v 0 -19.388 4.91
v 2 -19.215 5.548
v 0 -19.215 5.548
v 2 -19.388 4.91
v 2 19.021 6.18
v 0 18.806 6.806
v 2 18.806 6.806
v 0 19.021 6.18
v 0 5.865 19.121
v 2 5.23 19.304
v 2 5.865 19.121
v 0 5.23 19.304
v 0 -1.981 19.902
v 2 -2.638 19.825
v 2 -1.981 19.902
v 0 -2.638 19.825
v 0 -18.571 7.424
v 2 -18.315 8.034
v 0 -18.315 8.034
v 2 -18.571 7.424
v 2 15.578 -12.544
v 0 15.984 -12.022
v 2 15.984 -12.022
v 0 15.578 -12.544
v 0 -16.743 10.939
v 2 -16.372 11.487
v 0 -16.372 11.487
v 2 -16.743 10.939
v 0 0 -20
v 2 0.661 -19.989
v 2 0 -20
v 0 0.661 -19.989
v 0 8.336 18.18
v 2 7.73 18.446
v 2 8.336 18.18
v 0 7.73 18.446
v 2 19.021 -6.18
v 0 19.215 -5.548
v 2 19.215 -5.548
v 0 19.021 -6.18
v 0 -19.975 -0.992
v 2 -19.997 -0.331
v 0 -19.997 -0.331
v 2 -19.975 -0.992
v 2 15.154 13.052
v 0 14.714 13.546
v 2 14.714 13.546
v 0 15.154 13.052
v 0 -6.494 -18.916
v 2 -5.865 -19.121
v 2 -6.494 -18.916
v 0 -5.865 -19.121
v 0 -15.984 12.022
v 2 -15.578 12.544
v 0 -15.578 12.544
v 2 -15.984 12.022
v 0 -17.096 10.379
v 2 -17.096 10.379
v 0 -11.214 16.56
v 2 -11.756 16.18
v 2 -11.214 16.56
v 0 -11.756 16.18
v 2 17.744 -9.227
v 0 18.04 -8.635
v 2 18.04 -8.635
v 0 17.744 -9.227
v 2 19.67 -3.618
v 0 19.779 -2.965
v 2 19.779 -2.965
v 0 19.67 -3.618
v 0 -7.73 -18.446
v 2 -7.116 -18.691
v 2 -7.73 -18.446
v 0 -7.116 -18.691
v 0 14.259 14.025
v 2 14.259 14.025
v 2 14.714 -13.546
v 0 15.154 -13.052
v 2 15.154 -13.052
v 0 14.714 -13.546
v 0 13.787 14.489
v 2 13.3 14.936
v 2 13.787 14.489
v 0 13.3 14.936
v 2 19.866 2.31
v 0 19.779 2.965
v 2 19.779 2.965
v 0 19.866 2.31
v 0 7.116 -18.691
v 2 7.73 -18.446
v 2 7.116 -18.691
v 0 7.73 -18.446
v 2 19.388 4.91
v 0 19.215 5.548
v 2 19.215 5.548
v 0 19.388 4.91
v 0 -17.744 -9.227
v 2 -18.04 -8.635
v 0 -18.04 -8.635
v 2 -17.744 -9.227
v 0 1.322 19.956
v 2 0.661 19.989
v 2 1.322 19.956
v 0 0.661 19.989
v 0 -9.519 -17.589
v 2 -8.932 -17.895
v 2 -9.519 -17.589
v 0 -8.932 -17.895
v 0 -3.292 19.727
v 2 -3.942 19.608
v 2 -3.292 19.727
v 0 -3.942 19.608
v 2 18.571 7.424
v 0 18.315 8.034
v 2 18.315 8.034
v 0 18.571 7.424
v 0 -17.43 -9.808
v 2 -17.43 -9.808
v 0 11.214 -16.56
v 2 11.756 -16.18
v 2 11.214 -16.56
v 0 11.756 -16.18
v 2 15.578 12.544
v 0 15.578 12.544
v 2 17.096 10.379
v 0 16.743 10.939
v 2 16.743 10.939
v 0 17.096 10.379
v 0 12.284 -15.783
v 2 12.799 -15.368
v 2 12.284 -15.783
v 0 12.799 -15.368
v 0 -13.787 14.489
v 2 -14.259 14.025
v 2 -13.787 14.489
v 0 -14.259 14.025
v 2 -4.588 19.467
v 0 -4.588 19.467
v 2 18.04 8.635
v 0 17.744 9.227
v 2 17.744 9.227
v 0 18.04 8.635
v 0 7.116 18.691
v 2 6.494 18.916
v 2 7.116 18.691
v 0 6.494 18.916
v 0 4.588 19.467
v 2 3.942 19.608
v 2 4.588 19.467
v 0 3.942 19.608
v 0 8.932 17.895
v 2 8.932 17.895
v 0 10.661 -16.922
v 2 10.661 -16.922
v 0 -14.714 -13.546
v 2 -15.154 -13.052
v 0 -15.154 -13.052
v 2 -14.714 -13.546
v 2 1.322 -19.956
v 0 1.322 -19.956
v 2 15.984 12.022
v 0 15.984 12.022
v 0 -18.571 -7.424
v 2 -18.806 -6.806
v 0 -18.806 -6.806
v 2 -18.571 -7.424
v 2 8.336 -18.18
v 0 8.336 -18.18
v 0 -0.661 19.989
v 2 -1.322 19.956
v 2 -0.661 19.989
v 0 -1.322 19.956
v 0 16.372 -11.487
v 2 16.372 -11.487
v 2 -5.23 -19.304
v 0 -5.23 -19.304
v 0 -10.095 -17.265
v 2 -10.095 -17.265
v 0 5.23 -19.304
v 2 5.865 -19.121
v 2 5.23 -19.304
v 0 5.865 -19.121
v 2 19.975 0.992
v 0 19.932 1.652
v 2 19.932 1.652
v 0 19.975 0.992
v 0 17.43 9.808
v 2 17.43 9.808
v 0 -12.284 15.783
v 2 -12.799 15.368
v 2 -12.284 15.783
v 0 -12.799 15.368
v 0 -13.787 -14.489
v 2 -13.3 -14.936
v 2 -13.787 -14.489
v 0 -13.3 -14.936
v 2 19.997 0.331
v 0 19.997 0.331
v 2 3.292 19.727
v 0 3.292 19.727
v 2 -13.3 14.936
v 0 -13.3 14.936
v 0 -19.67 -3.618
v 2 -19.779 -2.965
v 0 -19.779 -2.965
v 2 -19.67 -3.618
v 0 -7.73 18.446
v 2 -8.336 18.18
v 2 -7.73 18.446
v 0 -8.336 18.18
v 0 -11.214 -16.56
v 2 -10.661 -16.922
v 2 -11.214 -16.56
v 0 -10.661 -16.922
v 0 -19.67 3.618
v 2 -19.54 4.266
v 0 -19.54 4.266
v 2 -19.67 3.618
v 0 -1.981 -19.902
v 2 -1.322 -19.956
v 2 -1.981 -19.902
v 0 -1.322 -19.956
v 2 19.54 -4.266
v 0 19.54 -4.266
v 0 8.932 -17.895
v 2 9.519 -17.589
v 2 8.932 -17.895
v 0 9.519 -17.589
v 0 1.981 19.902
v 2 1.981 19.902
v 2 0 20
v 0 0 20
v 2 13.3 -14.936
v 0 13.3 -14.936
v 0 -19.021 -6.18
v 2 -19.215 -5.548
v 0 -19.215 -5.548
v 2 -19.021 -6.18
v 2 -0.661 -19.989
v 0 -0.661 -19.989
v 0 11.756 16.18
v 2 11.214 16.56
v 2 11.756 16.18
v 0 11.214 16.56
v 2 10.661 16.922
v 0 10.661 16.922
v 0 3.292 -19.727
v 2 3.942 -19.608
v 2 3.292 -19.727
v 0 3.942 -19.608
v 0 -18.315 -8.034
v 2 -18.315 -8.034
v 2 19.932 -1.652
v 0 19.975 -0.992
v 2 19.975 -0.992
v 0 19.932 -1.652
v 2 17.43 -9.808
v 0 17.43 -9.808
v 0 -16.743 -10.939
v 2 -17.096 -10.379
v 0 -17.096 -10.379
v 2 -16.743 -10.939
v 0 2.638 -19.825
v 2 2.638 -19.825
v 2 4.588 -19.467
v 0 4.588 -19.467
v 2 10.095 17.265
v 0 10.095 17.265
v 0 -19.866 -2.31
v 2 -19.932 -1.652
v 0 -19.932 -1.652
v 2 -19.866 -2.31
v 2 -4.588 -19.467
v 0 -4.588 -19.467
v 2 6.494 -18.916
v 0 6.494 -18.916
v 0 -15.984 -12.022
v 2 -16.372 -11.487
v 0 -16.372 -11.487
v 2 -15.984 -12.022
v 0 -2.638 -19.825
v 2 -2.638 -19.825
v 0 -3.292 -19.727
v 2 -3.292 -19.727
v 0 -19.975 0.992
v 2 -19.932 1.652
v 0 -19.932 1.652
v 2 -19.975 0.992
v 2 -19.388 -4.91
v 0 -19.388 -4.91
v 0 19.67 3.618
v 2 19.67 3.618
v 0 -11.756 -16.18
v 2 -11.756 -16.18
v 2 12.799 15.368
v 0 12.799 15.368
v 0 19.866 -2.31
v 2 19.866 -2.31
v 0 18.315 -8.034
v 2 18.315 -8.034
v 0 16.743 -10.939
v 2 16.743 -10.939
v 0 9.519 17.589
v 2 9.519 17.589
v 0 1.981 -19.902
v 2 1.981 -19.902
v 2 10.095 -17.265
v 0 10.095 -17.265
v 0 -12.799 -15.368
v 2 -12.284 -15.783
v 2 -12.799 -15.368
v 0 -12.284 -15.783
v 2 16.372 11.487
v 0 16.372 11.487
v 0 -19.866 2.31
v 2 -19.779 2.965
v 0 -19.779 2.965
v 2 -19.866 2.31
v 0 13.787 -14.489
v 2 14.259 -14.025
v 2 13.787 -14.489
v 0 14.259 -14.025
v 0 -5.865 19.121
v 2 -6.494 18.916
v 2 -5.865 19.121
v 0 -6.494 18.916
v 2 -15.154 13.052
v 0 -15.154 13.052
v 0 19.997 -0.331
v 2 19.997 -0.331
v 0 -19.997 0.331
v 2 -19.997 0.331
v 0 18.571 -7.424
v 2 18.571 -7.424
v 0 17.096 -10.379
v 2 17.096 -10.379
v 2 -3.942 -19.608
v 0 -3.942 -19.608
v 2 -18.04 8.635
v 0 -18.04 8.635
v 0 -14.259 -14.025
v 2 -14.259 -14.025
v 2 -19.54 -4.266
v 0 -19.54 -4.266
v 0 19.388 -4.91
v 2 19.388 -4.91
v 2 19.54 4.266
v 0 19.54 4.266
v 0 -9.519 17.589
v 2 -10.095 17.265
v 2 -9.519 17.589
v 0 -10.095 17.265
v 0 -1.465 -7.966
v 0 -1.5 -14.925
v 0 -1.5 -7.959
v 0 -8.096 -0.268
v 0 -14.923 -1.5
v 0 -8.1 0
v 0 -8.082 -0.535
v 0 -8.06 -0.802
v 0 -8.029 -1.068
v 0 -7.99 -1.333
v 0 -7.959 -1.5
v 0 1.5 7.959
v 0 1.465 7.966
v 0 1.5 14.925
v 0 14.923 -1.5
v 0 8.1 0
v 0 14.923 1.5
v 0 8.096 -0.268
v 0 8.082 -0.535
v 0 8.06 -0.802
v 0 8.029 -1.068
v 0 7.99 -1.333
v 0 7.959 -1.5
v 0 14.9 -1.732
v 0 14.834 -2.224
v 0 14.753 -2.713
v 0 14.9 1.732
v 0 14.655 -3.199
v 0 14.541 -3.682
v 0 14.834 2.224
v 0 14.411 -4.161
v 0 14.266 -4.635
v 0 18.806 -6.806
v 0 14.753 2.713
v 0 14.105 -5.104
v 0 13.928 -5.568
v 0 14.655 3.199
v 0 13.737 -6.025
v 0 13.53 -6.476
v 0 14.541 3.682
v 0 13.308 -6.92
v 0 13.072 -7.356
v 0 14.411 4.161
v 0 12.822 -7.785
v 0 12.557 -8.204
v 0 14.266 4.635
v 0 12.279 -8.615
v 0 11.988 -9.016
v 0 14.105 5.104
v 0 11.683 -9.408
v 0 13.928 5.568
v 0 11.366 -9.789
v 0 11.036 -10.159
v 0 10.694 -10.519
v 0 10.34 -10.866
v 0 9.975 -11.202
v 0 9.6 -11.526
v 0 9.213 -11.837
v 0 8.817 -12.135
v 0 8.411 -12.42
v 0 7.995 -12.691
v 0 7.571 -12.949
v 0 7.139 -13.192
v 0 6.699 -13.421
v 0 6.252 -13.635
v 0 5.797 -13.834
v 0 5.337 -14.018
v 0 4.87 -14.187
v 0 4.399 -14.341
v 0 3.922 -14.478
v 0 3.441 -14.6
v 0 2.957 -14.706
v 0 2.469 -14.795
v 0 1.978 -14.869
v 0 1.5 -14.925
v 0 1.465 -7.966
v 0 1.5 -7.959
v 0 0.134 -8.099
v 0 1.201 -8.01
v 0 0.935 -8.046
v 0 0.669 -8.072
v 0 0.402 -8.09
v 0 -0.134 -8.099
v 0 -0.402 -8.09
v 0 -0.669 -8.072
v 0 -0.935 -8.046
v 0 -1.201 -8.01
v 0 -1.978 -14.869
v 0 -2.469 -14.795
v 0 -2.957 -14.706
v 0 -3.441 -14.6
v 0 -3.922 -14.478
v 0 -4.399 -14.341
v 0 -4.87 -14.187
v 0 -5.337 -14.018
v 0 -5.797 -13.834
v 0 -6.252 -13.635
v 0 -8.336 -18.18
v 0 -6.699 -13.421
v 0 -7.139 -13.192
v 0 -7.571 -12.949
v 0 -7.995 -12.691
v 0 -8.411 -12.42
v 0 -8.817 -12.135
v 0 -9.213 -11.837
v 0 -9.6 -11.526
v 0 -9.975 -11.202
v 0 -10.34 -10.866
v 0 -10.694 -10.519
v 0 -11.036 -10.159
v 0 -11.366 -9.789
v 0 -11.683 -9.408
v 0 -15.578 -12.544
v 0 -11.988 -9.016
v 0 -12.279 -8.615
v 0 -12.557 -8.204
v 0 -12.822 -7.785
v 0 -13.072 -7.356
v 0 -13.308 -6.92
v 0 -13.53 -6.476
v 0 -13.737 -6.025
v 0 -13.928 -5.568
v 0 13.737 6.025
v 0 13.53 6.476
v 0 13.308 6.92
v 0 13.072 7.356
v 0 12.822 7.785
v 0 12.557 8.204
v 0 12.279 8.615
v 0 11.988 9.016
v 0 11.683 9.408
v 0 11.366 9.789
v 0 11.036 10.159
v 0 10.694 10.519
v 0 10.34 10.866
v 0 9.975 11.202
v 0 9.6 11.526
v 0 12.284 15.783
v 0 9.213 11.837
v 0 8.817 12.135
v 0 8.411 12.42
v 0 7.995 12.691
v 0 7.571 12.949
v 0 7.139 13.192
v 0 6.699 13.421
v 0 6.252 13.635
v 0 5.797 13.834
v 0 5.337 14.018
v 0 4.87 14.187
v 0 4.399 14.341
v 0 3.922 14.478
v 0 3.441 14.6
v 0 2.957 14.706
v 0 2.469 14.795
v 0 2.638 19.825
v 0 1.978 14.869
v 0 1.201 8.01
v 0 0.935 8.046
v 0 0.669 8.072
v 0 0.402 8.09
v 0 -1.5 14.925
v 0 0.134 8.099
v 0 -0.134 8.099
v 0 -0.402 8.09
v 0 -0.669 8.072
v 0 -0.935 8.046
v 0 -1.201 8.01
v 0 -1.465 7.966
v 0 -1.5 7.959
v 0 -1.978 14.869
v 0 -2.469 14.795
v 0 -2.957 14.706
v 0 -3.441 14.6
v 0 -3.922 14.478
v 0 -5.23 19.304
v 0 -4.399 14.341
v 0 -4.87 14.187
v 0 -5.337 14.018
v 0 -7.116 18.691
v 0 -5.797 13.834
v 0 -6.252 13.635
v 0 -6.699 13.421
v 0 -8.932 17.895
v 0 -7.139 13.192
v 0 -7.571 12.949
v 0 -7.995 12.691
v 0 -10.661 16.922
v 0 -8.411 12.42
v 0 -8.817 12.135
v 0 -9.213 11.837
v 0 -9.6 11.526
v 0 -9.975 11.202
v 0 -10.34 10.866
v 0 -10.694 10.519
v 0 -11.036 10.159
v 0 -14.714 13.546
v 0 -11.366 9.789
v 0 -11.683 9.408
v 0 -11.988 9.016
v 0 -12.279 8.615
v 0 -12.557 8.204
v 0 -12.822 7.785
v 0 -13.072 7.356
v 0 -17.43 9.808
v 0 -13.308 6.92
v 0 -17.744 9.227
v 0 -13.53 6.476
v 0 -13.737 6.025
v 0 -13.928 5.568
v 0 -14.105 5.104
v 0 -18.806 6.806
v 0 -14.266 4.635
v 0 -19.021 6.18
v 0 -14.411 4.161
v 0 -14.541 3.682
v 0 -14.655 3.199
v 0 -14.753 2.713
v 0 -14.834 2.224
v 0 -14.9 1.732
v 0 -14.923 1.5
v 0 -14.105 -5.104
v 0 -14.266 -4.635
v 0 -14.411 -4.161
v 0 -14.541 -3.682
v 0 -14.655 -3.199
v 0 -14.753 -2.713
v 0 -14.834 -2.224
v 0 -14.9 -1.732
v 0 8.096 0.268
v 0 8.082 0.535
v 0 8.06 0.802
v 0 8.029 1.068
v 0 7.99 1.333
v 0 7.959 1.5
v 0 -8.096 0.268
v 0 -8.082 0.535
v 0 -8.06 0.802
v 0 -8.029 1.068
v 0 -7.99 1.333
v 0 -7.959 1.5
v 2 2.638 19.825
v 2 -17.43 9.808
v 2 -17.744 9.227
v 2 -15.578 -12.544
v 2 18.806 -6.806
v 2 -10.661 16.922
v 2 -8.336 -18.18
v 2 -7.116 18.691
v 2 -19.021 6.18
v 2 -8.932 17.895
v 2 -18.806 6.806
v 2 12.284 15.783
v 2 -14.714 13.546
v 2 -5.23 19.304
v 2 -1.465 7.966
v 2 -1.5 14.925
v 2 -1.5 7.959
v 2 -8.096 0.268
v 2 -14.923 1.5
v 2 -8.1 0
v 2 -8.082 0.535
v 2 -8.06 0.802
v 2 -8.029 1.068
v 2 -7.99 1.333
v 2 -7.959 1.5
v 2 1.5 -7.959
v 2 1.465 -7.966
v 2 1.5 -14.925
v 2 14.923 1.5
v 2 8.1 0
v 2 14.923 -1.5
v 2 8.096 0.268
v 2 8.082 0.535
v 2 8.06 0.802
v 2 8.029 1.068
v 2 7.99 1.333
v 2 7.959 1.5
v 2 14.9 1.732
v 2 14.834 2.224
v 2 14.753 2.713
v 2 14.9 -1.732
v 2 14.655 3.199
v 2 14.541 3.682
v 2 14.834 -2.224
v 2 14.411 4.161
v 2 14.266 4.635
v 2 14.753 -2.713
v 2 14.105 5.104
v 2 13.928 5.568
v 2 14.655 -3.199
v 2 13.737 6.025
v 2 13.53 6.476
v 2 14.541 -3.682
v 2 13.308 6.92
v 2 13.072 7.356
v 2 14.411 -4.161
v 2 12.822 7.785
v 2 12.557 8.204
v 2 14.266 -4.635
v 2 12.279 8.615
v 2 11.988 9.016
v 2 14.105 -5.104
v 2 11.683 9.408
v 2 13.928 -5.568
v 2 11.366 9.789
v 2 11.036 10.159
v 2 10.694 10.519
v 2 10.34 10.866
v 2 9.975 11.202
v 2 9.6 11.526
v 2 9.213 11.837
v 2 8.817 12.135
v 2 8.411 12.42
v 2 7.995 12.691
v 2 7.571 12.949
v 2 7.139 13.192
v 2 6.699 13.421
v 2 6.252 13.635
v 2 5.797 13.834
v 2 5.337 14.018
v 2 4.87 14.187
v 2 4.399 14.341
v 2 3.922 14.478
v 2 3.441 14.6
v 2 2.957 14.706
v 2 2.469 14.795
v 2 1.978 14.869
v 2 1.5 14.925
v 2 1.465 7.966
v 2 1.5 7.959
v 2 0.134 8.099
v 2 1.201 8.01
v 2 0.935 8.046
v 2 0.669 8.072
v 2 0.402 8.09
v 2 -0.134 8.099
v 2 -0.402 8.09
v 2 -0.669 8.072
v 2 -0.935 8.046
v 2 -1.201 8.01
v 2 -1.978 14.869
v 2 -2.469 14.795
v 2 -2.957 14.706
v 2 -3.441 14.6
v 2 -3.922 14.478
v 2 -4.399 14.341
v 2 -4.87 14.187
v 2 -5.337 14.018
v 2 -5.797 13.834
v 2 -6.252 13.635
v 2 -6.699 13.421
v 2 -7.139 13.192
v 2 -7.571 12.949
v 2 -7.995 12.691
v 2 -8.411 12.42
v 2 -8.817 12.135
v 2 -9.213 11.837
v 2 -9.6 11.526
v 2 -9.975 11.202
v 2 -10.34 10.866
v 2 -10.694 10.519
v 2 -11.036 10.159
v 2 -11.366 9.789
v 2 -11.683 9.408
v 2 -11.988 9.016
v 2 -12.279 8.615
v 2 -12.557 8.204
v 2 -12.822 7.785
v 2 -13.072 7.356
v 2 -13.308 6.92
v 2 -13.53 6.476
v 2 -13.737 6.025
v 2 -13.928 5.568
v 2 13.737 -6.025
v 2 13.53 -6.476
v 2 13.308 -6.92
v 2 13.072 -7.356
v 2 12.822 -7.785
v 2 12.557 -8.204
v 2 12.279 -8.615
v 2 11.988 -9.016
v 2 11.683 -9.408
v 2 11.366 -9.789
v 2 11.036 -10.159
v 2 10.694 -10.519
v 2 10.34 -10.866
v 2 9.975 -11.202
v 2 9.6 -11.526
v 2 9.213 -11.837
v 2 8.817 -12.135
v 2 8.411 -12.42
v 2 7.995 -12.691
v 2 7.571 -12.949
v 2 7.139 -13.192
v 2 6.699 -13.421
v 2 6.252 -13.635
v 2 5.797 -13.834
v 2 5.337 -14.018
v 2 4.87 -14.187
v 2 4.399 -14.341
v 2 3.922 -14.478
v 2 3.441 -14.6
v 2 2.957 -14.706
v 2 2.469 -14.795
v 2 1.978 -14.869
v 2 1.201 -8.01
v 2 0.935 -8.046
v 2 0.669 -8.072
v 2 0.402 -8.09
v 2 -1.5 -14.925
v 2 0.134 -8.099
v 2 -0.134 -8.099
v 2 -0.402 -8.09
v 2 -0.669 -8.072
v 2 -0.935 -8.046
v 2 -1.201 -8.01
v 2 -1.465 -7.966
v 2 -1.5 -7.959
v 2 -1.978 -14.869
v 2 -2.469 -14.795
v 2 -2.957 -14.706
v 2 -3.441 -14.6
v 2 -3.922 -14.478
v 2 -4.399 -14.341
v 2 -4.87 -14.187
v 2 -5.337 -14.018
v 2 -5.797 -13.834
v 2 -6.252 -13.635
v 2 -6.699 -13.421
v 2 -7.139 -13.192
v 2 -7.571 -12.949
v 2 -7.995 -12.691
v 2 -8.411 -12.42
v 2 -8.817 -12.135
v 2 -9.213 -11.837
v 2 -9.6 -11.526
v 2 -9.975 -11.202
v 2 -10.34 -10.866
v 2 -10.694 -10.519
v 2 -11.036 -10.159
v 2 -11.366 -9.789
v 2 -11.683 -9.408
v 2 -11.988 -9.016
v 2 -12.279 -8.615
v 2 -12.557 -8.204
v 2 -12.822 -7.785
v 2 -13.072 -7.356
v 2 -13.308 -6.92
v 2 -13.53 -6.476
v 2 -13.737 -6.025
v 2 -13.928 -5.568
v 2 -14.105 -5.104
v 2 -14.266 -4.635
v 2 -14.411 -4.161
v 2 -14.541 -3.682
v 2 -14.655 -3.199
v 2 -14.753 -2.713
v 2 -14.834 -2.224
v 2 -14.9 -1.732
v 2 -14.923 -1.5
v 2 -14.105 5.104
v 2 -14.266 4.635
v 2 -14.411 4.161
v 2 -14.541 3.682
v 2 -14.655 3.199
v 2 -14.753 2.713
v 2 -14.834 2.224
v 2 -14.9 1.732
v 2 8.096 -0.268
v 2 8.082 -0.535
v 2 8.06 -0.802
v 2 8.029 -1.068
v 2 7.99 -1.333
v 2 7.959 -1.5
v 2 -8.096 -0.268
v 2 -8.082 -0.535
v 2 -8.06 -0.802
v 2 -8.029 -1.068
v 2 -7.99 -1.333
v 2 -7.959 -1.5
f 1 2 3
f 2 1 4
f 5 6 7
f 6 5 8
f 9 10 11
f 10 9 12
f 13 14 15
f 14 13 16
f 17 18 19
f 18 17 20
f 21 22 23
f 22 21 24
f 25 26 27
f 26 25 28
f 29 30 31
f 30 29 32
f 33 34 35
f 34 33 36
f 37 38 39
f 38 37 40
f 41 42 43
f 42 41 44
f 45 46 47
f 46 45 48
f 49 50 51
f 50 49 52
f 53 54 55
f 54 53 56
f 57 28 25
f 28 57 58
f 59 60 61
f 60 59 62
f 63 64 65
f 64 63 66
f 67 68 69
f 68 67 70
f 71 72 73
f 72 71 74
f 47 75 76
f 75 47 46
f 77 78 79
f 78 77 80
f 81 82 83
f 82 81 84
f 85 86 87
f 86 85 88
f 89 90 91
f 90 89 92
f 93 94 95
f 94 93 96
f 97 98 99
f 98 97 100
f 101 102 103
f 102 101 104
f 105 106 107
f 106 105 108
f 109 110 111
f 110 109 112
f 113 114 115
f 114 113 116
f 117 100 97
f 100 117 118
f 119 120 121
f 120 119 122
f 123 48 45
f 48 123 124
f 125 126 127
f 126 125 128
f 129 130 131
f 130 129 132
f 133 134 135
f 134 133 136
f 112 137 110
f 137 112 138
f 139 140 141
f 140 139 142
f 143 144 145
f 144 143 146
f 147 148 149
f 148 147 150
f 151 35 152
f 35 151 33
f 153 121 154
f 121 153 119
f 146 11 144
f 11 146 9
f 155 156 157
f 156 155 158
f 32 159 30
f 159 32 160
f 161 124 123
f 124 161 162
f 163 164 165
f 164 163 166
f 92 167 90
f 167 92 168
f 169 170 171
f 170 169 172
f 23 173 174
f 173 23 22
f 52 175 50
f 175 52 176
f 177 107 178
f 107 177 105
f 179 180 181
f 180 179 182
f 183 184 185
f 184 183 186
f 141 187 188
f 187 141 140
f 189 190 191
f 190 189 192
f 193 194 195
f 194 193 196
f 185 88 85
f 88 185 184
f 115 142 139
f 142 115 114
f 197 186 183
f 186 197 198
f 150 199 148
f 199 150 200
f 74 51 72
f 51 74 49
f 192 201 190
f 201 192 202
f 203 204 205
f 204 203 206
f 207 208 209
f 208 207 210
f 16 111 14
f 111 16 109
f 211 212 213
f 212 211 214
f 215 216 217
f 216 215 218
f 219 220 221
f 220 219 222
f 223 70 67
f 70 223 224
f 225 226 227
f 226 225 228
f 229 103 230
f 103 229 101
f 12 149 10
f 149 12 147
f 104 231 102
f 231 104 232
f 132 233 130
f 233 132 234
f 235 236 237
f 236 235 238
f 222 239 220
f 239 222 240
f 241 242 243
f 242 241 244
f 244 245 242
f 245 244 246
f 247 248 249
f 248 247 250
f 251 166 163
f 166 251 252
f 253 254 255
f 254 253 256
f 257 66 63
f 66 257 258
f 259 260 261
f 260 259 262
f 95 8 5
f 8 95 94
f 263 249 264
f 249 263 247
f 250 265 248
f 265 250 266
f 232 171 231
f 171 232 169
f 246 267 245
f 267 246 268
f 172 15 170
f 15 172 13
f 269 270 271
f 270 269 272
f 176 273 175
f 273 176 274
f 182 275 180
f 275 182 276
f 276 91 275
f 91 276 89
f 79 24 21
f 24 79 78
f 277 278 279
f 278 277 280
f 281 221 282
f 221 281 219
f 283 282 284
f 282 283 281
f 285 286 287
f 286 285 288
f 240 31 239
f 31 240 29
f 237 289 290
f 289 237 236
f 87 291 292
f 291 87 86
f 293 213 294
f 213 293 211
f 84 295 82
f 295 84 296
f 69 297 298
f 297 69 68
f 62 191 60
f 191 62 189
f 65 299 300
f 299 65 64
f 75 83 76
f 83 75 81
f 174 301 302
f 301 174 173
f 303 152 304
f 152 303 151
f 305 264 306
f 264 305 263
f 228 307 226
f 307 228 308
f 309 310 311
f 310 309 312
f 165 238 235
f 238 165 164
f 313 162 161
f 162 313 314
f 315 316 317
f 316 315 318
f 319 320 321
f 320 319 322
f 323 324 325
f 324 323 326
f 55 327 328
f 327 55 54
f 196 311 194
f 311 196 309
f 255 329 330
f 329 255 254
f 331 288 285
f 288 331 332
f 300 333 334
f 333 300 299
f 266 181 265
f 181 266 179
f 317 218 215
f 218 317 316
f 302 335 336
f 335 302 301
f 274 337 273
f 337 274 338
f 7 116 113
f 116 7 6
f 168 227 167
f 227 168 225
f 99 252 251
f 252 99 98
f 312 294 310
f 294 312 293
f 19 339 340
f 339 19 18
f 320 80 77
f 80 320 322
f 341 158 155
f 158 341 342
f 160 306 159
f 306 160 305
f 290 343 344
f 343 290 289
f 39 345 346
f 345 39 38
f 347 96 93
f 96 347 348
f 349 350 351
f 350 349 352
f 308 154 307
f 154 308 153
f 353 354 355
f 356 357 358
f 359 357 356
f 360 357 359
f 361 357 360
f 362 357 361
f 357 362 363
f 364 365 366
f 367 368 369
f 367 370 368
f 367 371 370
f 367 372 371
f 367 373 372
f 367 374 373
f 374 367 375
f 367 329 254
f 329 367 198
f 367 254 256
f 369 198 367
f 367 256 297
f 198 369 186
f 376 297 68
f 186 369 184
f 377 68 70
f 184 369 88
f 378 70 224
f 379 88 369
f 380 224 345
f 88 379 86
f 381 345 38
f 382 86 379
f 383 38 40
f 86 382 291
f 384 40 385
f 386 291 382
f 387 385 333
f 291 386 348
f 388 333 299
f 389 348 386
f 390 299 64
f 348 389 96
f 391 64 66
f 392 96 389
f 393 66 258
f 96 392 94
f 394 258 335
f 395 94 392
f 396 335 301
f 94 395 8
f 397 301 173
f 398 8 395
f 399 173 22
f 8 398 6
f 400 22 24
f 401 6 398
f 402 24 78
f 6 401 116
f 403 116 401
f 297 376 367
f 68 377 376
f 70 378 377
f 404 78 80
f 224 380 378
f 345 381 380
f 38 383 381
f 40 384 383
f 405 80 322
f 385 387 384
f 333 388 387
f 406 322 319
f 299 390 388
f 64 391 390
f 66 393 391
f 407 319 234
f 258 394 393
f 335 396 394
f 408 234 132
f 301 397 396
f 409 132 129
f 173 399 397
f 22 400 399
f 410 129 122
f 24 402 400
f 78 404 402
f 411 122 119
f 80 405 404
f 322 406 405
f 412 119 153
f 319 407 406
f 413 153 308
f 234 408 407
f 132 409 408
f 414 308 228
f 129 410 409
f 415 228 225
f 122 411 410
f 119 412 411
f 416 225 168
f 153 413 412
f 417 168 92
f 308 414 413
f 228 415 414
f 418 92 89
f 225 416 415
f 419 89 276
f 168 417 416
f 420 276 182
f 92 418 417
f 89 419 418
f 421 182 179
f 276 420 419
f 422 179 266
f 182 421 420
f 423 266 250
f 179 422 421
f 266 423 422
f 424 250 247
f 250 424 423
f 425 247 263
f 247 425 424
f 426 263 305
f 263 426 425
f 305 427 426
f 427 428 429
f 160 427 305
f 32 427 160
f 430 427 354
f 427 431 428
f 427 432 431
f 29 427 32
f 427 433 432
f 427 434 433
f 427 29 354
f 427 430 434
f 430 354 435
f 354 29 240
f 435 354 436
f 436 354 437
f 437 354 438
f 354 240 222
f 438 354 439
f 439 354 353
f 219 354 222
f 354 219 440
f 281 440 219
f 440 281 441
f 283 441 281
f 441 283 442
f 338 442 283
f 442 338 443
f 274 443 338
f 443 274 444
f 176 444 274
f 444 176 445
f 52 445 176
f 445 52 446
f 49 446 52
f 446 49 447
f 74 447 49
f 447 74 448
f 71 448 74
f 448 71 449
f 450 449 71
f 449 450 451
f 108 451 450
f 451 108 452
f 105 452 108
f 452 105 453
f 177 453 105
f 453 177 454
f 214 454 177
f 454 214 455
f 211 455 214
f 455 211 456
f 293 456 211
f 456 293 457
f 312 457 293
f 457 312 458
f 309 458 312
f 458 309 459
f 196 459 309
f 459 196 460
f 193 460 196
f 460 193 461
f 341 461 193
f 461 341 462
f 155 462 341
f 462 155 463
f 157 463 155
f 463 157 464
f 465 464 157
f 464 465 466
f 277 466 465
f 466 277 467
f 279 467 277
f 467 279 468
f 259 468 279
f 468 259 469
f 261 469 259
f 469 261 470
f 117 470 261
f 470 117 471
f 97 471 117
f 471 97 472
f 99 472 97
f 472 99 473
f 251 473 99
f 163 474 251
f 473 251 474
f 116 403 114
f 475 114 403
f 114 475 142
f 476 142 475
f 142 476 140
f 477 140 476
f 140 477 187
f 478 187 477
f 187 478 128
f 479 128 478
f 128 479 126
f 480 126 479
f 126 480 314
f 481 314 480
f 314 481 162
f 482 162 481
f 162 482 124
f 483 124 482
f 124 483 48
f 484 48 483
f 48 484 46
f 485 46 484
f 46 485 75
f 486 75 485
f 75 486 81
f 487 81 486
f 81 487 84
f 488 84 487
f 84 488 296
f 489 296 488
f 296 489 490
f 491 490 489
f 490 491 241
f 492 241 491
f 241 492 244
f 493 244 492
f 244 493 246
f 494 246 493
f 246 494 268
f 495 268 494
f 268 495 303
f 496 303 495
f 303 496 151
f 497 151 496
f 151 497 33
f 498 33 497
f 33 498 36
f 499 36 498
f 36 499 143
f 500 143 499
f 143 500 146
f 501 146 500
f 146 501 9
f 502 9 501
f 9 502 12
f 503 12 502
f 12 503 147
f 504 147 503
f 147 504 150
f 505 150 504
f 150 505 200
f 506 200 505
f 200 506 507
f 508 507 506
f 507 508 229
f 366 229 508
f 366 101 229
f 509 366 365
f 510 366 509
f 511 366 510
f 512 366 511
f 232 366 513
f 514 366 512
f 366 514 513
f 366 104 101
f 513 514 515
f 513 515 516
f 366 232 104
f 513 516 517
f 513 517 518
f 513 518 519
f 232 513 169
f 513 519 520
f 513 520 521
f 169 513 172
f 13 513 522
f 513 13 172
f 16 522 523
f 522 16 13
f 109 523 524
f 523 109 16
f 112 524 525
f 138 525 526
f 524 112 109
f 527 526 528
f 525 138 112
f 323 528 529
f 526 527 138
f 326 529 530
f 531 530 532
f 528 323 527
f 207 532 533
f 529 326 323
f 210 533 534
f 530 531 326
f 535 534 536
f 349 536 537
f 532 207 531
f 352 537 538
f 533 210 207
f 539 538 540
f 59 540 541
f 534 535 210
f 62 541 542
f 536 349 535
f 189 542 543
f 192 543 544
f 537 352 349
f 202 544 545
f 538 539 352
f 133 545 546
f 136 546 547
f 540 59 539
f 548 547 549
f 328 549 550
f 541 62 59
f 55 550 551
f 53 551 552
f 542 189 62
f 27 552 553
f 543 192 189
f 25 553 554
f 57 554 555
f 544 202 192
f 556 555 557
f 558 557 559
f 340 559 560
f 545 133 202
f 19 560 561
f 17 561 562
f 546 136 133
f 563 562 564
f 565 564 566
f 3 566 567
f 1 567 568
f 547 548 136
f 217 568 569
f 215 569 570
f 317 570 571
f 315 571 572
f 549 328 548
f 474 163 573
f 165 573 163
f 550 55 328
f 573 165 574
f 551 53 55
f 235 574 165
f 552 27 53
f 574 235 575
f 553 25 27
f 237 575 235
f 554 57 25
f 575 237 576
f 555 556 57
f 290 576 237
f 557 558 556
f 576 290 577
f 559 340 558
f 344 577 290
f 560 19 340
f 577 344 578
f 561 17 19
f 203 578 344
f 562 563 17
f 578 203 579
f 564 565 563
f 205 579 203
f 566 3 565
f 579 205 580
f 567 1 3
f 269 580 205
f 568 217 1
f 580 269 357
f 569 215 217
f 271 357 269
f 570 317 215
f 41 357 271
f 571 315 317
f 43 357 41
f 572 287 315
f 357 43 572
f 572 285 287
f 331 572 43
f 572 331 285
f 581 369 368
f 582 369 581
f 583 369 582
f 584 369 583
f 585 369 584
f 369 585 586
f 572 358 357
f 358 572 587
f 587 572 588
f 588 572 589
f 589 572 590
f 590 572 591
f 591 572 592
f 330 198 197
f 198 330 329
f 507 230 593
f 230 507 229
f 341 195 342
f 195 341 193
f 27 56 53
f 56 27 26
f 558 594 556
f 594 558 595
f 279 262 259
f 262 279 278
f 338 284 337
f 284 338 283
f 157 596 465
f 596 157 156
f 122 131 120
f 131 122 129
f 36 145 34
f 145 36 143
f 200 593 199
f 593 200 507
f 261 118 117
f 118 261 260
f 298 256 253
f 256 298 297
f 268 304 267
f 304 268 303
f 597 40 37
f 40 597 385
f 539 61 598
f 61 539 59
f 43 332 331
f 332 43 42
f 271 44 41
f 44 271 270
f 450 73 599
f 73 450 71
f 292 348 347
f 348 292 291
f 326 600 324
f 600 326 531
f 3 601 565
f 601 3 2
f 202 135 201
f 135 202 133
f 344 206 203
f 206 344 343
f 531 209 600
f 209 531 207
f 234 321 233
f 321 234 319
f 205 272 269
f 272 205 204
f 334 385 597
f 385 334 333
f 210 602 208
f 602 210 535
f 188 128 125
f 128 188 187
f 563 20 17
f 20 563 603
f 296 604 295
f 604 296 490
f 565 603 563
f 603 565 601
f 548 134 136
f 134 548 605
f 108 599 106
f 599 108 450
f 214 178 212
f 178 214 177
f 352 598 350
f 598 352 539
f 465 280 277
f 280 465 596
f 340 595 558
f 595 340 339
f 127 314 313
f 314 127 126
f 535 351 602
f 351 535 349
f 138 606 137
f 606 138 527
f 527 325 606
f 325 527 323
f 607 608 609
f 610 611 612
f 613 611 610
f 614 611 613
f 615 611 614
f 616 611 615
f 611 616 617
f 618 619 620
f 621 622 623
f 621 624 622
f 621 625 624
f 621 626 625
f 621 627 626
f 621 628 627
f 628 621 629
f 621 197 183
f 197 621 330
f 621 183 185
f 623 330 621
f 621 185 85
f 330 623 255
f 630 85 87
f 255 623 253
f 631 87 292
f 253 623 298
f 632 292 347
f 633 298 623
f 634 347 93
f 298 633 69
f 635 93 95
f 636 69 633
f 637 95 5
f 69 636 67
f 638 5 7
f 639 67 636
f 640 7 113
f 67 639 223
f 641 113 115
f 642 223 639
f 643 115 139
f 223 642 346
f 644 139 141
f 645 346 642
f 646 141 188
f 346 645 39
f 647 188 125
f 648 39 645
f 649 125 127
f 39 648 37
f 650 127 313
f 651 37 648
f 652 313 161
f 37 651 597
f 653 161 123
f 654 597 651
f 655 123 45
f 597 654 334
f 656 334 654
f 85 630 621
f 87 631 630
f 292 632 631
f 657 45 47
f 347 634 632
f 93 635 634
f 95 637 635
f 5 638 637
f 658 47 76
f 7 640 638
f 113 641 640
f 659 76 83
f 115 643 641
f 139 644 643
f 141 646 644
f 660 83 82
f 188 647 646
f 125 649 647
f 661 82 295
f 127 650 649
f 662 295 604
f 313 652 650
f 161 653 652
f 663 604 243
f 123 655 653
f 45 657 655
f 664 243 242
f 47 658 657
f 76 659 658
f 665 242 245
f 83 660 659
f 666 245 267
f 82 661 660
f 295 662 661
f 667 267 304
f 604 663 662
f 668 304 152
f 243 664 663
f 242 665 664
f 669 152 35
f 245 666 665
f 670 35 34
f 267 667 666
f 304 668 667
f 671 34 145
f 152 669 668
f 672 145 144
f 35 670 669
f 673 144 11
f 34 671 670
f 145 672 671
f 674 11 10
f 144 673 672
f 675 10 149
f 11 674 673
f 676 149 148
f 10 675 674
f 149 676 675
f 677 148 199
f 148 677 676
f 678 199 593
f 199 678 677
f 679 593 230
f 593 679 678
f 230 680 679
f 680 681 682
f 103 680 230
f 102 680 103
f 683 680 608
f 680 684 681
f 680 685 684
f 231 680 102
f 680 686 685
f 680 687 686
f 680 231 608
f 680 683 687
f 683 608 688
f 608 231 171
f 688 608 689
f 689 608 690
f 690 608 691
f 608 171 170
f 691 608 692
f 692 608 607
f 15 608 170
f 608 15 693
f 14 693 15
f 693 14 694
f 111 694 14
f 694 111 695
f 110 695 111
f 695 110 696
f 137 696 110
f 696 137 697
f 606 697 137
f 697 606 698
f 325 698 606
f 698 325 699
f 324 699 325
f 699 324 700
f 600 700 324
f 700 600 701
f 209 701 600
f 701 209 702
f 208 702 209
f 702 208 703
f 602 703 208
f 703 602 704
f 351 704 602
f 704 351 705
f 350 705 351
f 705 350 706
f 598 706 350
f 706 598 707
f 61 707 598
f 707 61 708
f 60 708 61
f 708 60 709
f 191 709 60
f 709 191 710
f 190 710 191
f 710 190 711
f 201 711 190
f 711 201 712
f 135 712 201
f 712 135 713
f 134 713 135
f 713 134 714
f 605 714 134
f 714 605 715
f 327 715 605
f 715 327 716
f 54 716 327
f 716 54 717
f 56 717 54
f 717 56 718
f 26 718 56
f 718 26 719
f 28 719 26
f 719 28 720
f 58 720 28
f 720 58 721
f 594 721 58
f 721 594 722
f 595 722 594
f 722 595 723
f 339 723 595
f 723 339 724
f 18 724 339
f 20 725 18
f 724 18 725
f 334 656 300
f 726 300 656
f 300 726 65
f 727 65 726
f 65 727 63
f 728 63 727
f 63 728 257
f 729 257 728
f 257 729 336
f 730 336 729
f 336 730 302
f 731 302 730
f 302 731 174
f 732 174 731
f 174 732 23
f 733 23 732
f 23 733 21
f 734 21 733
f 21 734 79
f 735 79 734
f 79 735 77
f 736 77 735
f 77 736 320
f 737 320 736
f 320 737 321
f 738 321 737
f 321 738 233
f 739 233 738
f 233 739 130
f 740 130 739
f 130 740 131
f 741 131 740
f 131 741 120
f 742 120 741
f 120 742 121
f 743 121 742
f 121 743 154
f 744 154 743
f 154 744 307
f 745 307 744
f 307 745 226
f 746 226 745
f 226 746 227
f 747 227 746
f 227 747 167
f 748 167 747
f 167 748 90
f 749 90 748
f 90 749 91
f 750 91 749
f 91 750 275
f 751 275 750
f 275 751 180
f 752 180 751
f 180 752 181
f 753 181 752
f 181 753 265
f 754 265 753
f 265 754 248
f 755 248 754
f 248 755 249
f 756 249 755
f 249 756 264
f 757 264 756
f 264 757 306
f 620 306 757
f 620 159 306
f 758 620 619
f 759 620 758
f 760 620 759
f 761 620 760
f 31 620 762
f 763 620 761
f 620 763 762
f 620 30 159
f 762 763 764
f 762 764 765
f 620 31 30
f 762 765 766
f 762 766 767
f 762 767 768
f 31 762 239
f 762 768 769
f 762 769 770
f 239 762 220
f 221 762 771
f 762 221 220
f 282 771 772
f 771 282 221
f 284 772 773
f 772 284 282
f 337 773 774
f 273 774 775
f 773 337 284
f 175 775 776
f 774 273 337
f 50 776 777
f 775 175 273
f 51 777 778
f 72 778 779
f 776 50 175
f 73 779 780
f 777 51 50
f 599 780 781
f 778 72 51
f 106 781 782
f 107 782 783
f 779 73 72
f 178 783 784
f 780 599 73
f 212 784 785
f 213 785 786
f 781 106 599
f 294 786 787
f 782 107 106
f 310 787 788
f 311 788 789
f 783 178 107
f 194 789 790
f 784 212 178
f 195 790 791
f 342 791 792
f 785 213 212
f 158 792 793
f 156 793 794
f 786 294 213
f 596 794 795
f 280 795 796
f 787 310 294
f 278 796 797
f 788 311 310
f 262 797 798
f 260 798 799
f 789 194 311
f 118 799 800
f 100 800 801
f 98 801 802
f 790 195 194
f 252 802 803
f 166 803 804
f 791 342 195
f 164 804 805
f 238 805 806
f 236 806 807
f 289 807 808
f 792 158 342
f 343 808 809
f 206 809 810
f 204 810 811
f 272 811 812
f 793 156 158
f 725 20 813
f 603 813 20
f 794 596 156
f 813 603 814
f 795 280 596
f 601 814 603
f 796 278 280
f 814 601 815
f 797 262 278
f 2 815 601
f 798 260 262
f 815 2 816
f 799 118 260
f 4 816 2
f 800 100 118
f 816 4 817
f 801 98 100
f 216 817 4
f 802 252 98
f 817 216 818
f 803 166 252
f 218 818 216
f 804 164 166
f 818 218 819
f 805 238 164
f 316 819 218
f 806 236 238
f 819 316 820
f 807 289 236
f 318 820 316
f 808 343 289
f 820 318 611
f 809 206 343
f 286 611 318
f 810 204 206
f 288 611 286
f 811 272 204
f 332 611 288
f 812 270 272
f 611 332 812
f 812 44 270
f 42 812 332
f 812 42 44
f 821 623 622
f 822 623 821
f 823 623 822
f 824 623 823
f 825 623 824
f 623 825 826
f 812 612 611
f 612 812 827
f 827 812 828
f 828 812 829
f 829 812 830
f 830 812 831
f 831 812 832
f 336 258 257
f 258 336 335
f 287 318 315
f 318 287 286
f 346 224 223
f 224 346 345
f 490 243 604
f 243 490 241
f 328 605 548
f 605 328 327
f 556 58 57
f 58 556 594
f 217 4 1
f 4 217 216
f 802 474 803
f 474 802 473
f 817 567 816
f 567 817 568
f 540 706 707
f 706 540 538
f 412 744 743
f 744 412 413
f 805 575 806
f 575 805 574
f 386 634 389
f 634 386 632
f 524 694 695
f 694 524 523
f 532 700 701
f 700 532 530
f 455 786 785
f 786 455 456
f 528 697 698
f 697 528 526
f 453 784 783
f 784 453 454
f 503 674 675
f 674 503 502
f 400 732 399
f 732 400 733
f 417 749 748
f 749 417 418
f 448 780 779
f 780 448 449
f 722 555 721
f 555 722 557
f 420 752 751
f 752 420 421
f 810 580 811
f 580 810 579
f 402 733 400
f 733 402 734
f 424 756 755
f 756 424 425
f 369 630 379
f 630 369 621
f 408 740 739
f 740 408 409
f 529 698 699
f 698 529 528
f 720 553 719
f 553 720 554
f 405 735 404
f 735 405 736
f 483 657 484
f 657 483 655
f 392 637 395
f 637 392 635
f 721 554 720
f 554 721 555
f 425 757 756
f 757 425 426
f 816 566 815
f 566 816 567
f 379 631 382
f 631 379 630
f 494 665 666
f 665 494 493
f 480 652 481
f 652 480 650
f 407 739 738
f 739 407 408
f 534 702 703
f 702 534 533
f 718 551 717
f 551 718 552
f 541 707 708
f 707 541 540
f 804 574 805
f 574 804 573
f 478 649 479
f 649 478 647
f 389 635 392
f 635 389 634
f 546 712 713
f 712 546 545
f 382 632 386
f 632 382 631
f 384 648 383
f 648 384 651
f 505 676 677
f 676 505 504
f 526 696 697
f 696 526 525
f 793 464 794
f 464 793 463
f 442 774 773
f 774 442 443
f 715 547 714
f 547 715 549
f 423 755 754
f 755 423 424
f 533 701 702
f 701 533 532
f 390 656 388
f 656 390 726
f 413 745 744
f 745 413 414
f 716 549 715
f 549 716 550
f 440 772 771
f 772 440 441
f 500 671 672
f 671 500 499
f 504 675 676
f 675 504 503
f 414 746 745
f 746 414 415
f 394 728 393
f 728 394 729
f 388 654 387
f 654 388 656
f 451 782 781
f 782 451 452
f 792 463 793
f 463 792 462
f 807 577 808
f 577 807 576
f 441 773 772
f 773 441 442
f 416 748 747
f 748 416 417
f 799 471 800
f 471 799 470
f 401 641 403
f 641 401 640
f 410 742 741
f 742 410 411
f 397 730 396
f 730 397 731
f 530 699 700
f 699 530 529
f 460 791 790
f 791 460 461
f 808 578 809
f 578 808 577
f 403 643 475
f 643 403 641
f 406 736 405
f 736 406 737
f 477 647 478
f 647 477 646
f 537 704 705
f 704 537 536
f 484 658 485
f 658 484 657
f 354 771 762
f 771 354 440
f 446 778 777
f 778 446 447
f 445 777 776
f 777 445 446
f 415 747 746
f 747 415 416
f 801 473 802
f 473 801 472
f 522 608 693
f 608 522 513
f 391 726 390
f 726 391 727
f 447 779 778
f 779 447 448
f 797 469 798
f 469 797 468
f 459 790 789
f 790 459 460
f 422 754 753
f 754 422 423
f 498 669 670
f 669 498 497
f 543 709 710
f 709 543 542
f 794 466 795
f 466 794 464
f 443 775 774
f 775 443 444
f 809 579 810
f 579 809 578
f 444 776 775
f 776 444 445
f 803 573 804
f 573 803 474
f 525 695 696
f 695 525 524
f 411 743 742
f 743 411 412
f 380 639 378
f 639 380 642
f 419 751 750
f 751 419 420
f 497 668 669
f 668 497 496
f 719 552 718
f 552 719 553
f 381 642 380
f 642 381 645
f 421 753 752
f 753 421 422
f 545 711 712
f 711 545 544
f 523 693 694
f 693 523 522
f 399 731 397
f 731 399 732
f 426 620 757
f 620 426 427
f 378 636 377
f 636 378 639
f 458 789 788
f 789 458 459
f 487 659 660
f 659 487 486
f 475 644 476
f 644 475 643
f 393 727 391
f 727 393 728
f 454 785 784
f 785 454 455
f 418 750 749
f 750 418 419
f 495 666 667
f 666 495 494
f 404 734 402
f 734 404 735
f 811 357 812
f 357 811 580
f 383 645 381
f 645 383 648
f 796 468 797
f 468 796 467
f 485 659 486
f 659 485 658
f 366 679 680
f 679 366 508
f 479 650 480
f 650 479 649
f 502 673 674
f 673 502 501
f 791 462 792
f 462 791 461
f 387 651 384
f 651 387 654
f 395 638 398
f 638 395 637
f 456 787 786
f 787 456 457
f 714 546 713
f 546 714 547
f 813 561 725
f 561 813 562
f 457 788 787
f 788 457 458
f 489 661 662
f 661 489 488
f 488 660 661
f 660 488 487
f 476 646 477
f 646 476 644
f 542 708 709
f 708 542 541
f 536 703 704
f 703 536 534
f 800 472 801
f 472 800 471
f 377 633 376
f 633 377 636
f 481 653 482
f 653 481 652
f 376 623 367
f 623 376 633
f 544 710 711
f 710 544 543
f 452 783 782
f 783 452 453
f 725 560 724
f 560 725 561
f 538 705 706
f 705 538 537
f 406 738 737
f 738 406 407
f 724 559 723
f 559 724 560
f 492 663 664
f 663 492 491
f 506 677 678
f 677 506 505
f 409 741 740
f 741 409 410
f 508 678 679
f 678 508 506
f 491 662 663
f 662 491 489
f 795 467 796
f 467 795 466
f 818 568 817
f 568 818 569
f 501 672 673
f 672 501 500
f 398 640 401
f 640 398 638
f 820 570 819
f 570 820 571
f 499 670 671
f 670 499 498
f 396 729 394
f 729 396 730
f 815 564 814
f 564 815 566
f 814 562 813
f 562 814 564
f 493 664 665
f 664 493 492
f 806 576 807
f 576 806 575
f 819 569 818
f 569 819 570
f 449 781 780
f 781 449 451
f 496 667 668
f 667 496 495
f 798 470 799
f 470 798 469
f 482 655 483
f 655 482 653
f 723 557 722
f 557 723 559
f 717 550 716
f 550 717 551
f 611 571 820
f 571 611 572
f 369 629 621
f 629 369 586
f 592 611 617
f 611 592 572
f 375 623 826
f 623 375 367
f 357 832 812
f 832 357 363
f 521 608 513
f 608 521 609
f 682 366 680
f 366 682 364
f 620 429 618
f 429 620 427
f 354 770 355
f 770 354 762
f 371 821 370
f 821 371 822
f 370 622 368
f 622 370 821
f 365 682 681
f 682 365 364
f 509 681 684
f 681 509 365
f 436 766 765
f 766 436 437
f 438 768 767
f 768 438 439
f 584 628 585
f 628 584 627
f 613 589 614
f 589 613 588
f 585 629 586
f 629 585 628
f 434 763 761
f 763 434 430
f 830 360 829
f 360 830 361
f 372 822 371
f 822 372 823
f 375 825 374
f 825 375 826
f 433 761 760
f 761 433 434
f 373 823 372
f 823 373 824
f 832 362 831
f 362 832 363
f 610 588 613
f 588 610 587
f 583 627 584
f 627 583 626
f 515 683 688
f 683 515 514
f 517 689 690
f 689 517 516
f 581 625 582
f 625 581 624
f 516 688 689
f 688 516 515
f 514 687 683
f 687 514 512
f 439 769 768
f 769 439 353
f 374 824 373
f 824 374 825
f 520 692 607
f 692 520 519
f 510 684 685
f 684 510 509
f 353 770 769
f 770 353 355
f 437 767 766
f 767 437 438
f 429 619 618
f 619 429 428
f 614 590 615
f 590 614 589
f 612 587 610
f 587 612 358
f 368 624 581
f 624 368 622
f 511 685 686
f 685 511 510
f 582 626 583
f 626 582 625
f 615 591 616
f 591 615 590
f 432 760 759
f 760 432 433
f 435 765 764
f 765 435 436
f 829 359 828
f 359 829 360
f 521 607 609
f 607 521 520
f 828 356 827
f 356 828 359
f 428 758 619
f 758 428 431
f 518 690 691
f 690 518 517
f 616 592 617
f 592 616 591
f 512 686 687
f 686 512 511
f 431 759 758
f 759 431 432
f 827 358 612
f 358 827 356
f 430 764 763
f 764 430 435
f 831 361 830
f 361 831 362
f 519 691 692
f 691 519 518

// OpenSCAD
$fn=190;

module rouleaux_1(L,D) {
	difference() {
		rotate([0,90,0])cylinder(d=D, h=L);
		translate([-1,0,0])rotate([0,90,0])cylinder(d=D-3, h=L+2);
	}
	difference() {
		union () {	
			translate([0,0,-1.5])cube([L,D/2-1,3]);
			translate([0,1.5,0])rotate([90,0,0])cube([L,D/2-1,3]);
			translate([0,0,1.5])rotate([180,0,0])cube([L,D/2-1,3]);
			translate([0,-1.5,0])rotate([-90,0,0])cube([L,D/2-1,3]);
			translate([L,0,0])rotate([-90,0,90])cylinder(d=8, h=L+6);
		}
		translate([L+17,0,0])rotate([-90,0,90])cylinder(d=6.2, h=81);
	}
	//translate([L+17,0,0])rotate([-90,0,90])#cylinder(d=2.8, h=81);

}

/*module rouleaux_2(L,D) {
		rotate([0,90,0])cylinder(d=D, h=L);
}*/

module fixation_rouleau_1() {
	difference() {

		cube([25,20,3]);
		translate([5,10,-1])rotate([0,0,90]) rail(15);
		//translate([5,22.5,-1])rotate([0,0,90]) rail(15);
	}
	difference() {
		translate([0,0,0])cube([25,3,33]);
		translate([12.5,-1,23])rotate([-90,0,0])cylinder(d=16.35, h=5); // roulement a bille 16.5 avant
	}	
}

/*module fixation_rouleau_2(L_axes, Pos_Y_axes) {
	difference() {
		cube([25,30,3]);
		translate([5,22.5,-1]) rail(15);
		translate([15,22.5,-1]) rail(15);
	}
	difference() {
		translate([0,0,0])cube([25,3,30]);
		translate([12.5,-1,25])rotate([-90,0,0])cylinder(d=10, h=5);
	}
	translate([12.5,Pos_Y_axes,25])rotate([-90,0,0])cylinder(d=5, h=L_axes);	
}*/

module rail(L) {
	rotate([0,-90,-180]) {
	#translate([0,0,0.4])cube([7,L,4.2]);
	translate([0,0,2.5])rotate([0,90,0])cylinder(d=4.2, h=7);
	translate([0,L,2.5])rotate([0,90,0])cylinder(d=4.2, h=7);
	}
}

module rouleau_1(L,D) {
	translate([12.5,10,25])rotate([0,0,90])rouleaux_1(L,D);
	fixation_rouleau_1();
	translate([0,41,0])mirror([0,1,0])fixation_rouleau_1();
}

/*module rouleau_2(L,D) {
	translate([12.5,7,25])rotate([0,0,90])rouleaux_2(L,D);
	fixation_rouleau_2(15,-5);
	translate([0,61,0])mirror([0,1,0])fixation_rouleau_2(15,-5);
}*/

module fixation_roulement_rouleau(){

	cylinder(h=20,r1=5/2,r2=4.3/2);
	//translate([0,0,20])cylinder(h=20,r1=6/2,r2=4.5/2);
}

module arret_cable(L,D){
difference() {
		rotate([0,90,0])cylinder(d=D, h=L);
		translate([-1,0,0])rotate([0,90,0])cylinder(d=D-10, h=L+2);
	}
	difference() {
		union () {	
			translate([0,0,-1.5])cube([L,D/2-1,3]);
			translate([0,1.5,0])rotate([90,0,0])cube([L,D/2-1,3]);
			translate([0,0,1.5])rotate([180,0,0])cube([L,D/2-1,3]);
			translate([0,-1.5,0])rotate([-90,0,0])cube([L,D/2-1,3]);
			//translate([L,0,0])rotate([-90,0,90])cylinder(d=8, h=L);
		}
		translate([L+17,0,0])rotate([-90,0,90])cylinder(d=16.2, h=81);
	}
}

//color("grey")translate([12.5,0,25])rotate([90,0,180])fixation_roulement_rouleau();
//rouleau_1(20,35);
//fixation_rouleau_1();
//rouleaux_1(20,35);
//translate([37,0,0])rouleau_1(47,35);
arret_cable(2,40);
